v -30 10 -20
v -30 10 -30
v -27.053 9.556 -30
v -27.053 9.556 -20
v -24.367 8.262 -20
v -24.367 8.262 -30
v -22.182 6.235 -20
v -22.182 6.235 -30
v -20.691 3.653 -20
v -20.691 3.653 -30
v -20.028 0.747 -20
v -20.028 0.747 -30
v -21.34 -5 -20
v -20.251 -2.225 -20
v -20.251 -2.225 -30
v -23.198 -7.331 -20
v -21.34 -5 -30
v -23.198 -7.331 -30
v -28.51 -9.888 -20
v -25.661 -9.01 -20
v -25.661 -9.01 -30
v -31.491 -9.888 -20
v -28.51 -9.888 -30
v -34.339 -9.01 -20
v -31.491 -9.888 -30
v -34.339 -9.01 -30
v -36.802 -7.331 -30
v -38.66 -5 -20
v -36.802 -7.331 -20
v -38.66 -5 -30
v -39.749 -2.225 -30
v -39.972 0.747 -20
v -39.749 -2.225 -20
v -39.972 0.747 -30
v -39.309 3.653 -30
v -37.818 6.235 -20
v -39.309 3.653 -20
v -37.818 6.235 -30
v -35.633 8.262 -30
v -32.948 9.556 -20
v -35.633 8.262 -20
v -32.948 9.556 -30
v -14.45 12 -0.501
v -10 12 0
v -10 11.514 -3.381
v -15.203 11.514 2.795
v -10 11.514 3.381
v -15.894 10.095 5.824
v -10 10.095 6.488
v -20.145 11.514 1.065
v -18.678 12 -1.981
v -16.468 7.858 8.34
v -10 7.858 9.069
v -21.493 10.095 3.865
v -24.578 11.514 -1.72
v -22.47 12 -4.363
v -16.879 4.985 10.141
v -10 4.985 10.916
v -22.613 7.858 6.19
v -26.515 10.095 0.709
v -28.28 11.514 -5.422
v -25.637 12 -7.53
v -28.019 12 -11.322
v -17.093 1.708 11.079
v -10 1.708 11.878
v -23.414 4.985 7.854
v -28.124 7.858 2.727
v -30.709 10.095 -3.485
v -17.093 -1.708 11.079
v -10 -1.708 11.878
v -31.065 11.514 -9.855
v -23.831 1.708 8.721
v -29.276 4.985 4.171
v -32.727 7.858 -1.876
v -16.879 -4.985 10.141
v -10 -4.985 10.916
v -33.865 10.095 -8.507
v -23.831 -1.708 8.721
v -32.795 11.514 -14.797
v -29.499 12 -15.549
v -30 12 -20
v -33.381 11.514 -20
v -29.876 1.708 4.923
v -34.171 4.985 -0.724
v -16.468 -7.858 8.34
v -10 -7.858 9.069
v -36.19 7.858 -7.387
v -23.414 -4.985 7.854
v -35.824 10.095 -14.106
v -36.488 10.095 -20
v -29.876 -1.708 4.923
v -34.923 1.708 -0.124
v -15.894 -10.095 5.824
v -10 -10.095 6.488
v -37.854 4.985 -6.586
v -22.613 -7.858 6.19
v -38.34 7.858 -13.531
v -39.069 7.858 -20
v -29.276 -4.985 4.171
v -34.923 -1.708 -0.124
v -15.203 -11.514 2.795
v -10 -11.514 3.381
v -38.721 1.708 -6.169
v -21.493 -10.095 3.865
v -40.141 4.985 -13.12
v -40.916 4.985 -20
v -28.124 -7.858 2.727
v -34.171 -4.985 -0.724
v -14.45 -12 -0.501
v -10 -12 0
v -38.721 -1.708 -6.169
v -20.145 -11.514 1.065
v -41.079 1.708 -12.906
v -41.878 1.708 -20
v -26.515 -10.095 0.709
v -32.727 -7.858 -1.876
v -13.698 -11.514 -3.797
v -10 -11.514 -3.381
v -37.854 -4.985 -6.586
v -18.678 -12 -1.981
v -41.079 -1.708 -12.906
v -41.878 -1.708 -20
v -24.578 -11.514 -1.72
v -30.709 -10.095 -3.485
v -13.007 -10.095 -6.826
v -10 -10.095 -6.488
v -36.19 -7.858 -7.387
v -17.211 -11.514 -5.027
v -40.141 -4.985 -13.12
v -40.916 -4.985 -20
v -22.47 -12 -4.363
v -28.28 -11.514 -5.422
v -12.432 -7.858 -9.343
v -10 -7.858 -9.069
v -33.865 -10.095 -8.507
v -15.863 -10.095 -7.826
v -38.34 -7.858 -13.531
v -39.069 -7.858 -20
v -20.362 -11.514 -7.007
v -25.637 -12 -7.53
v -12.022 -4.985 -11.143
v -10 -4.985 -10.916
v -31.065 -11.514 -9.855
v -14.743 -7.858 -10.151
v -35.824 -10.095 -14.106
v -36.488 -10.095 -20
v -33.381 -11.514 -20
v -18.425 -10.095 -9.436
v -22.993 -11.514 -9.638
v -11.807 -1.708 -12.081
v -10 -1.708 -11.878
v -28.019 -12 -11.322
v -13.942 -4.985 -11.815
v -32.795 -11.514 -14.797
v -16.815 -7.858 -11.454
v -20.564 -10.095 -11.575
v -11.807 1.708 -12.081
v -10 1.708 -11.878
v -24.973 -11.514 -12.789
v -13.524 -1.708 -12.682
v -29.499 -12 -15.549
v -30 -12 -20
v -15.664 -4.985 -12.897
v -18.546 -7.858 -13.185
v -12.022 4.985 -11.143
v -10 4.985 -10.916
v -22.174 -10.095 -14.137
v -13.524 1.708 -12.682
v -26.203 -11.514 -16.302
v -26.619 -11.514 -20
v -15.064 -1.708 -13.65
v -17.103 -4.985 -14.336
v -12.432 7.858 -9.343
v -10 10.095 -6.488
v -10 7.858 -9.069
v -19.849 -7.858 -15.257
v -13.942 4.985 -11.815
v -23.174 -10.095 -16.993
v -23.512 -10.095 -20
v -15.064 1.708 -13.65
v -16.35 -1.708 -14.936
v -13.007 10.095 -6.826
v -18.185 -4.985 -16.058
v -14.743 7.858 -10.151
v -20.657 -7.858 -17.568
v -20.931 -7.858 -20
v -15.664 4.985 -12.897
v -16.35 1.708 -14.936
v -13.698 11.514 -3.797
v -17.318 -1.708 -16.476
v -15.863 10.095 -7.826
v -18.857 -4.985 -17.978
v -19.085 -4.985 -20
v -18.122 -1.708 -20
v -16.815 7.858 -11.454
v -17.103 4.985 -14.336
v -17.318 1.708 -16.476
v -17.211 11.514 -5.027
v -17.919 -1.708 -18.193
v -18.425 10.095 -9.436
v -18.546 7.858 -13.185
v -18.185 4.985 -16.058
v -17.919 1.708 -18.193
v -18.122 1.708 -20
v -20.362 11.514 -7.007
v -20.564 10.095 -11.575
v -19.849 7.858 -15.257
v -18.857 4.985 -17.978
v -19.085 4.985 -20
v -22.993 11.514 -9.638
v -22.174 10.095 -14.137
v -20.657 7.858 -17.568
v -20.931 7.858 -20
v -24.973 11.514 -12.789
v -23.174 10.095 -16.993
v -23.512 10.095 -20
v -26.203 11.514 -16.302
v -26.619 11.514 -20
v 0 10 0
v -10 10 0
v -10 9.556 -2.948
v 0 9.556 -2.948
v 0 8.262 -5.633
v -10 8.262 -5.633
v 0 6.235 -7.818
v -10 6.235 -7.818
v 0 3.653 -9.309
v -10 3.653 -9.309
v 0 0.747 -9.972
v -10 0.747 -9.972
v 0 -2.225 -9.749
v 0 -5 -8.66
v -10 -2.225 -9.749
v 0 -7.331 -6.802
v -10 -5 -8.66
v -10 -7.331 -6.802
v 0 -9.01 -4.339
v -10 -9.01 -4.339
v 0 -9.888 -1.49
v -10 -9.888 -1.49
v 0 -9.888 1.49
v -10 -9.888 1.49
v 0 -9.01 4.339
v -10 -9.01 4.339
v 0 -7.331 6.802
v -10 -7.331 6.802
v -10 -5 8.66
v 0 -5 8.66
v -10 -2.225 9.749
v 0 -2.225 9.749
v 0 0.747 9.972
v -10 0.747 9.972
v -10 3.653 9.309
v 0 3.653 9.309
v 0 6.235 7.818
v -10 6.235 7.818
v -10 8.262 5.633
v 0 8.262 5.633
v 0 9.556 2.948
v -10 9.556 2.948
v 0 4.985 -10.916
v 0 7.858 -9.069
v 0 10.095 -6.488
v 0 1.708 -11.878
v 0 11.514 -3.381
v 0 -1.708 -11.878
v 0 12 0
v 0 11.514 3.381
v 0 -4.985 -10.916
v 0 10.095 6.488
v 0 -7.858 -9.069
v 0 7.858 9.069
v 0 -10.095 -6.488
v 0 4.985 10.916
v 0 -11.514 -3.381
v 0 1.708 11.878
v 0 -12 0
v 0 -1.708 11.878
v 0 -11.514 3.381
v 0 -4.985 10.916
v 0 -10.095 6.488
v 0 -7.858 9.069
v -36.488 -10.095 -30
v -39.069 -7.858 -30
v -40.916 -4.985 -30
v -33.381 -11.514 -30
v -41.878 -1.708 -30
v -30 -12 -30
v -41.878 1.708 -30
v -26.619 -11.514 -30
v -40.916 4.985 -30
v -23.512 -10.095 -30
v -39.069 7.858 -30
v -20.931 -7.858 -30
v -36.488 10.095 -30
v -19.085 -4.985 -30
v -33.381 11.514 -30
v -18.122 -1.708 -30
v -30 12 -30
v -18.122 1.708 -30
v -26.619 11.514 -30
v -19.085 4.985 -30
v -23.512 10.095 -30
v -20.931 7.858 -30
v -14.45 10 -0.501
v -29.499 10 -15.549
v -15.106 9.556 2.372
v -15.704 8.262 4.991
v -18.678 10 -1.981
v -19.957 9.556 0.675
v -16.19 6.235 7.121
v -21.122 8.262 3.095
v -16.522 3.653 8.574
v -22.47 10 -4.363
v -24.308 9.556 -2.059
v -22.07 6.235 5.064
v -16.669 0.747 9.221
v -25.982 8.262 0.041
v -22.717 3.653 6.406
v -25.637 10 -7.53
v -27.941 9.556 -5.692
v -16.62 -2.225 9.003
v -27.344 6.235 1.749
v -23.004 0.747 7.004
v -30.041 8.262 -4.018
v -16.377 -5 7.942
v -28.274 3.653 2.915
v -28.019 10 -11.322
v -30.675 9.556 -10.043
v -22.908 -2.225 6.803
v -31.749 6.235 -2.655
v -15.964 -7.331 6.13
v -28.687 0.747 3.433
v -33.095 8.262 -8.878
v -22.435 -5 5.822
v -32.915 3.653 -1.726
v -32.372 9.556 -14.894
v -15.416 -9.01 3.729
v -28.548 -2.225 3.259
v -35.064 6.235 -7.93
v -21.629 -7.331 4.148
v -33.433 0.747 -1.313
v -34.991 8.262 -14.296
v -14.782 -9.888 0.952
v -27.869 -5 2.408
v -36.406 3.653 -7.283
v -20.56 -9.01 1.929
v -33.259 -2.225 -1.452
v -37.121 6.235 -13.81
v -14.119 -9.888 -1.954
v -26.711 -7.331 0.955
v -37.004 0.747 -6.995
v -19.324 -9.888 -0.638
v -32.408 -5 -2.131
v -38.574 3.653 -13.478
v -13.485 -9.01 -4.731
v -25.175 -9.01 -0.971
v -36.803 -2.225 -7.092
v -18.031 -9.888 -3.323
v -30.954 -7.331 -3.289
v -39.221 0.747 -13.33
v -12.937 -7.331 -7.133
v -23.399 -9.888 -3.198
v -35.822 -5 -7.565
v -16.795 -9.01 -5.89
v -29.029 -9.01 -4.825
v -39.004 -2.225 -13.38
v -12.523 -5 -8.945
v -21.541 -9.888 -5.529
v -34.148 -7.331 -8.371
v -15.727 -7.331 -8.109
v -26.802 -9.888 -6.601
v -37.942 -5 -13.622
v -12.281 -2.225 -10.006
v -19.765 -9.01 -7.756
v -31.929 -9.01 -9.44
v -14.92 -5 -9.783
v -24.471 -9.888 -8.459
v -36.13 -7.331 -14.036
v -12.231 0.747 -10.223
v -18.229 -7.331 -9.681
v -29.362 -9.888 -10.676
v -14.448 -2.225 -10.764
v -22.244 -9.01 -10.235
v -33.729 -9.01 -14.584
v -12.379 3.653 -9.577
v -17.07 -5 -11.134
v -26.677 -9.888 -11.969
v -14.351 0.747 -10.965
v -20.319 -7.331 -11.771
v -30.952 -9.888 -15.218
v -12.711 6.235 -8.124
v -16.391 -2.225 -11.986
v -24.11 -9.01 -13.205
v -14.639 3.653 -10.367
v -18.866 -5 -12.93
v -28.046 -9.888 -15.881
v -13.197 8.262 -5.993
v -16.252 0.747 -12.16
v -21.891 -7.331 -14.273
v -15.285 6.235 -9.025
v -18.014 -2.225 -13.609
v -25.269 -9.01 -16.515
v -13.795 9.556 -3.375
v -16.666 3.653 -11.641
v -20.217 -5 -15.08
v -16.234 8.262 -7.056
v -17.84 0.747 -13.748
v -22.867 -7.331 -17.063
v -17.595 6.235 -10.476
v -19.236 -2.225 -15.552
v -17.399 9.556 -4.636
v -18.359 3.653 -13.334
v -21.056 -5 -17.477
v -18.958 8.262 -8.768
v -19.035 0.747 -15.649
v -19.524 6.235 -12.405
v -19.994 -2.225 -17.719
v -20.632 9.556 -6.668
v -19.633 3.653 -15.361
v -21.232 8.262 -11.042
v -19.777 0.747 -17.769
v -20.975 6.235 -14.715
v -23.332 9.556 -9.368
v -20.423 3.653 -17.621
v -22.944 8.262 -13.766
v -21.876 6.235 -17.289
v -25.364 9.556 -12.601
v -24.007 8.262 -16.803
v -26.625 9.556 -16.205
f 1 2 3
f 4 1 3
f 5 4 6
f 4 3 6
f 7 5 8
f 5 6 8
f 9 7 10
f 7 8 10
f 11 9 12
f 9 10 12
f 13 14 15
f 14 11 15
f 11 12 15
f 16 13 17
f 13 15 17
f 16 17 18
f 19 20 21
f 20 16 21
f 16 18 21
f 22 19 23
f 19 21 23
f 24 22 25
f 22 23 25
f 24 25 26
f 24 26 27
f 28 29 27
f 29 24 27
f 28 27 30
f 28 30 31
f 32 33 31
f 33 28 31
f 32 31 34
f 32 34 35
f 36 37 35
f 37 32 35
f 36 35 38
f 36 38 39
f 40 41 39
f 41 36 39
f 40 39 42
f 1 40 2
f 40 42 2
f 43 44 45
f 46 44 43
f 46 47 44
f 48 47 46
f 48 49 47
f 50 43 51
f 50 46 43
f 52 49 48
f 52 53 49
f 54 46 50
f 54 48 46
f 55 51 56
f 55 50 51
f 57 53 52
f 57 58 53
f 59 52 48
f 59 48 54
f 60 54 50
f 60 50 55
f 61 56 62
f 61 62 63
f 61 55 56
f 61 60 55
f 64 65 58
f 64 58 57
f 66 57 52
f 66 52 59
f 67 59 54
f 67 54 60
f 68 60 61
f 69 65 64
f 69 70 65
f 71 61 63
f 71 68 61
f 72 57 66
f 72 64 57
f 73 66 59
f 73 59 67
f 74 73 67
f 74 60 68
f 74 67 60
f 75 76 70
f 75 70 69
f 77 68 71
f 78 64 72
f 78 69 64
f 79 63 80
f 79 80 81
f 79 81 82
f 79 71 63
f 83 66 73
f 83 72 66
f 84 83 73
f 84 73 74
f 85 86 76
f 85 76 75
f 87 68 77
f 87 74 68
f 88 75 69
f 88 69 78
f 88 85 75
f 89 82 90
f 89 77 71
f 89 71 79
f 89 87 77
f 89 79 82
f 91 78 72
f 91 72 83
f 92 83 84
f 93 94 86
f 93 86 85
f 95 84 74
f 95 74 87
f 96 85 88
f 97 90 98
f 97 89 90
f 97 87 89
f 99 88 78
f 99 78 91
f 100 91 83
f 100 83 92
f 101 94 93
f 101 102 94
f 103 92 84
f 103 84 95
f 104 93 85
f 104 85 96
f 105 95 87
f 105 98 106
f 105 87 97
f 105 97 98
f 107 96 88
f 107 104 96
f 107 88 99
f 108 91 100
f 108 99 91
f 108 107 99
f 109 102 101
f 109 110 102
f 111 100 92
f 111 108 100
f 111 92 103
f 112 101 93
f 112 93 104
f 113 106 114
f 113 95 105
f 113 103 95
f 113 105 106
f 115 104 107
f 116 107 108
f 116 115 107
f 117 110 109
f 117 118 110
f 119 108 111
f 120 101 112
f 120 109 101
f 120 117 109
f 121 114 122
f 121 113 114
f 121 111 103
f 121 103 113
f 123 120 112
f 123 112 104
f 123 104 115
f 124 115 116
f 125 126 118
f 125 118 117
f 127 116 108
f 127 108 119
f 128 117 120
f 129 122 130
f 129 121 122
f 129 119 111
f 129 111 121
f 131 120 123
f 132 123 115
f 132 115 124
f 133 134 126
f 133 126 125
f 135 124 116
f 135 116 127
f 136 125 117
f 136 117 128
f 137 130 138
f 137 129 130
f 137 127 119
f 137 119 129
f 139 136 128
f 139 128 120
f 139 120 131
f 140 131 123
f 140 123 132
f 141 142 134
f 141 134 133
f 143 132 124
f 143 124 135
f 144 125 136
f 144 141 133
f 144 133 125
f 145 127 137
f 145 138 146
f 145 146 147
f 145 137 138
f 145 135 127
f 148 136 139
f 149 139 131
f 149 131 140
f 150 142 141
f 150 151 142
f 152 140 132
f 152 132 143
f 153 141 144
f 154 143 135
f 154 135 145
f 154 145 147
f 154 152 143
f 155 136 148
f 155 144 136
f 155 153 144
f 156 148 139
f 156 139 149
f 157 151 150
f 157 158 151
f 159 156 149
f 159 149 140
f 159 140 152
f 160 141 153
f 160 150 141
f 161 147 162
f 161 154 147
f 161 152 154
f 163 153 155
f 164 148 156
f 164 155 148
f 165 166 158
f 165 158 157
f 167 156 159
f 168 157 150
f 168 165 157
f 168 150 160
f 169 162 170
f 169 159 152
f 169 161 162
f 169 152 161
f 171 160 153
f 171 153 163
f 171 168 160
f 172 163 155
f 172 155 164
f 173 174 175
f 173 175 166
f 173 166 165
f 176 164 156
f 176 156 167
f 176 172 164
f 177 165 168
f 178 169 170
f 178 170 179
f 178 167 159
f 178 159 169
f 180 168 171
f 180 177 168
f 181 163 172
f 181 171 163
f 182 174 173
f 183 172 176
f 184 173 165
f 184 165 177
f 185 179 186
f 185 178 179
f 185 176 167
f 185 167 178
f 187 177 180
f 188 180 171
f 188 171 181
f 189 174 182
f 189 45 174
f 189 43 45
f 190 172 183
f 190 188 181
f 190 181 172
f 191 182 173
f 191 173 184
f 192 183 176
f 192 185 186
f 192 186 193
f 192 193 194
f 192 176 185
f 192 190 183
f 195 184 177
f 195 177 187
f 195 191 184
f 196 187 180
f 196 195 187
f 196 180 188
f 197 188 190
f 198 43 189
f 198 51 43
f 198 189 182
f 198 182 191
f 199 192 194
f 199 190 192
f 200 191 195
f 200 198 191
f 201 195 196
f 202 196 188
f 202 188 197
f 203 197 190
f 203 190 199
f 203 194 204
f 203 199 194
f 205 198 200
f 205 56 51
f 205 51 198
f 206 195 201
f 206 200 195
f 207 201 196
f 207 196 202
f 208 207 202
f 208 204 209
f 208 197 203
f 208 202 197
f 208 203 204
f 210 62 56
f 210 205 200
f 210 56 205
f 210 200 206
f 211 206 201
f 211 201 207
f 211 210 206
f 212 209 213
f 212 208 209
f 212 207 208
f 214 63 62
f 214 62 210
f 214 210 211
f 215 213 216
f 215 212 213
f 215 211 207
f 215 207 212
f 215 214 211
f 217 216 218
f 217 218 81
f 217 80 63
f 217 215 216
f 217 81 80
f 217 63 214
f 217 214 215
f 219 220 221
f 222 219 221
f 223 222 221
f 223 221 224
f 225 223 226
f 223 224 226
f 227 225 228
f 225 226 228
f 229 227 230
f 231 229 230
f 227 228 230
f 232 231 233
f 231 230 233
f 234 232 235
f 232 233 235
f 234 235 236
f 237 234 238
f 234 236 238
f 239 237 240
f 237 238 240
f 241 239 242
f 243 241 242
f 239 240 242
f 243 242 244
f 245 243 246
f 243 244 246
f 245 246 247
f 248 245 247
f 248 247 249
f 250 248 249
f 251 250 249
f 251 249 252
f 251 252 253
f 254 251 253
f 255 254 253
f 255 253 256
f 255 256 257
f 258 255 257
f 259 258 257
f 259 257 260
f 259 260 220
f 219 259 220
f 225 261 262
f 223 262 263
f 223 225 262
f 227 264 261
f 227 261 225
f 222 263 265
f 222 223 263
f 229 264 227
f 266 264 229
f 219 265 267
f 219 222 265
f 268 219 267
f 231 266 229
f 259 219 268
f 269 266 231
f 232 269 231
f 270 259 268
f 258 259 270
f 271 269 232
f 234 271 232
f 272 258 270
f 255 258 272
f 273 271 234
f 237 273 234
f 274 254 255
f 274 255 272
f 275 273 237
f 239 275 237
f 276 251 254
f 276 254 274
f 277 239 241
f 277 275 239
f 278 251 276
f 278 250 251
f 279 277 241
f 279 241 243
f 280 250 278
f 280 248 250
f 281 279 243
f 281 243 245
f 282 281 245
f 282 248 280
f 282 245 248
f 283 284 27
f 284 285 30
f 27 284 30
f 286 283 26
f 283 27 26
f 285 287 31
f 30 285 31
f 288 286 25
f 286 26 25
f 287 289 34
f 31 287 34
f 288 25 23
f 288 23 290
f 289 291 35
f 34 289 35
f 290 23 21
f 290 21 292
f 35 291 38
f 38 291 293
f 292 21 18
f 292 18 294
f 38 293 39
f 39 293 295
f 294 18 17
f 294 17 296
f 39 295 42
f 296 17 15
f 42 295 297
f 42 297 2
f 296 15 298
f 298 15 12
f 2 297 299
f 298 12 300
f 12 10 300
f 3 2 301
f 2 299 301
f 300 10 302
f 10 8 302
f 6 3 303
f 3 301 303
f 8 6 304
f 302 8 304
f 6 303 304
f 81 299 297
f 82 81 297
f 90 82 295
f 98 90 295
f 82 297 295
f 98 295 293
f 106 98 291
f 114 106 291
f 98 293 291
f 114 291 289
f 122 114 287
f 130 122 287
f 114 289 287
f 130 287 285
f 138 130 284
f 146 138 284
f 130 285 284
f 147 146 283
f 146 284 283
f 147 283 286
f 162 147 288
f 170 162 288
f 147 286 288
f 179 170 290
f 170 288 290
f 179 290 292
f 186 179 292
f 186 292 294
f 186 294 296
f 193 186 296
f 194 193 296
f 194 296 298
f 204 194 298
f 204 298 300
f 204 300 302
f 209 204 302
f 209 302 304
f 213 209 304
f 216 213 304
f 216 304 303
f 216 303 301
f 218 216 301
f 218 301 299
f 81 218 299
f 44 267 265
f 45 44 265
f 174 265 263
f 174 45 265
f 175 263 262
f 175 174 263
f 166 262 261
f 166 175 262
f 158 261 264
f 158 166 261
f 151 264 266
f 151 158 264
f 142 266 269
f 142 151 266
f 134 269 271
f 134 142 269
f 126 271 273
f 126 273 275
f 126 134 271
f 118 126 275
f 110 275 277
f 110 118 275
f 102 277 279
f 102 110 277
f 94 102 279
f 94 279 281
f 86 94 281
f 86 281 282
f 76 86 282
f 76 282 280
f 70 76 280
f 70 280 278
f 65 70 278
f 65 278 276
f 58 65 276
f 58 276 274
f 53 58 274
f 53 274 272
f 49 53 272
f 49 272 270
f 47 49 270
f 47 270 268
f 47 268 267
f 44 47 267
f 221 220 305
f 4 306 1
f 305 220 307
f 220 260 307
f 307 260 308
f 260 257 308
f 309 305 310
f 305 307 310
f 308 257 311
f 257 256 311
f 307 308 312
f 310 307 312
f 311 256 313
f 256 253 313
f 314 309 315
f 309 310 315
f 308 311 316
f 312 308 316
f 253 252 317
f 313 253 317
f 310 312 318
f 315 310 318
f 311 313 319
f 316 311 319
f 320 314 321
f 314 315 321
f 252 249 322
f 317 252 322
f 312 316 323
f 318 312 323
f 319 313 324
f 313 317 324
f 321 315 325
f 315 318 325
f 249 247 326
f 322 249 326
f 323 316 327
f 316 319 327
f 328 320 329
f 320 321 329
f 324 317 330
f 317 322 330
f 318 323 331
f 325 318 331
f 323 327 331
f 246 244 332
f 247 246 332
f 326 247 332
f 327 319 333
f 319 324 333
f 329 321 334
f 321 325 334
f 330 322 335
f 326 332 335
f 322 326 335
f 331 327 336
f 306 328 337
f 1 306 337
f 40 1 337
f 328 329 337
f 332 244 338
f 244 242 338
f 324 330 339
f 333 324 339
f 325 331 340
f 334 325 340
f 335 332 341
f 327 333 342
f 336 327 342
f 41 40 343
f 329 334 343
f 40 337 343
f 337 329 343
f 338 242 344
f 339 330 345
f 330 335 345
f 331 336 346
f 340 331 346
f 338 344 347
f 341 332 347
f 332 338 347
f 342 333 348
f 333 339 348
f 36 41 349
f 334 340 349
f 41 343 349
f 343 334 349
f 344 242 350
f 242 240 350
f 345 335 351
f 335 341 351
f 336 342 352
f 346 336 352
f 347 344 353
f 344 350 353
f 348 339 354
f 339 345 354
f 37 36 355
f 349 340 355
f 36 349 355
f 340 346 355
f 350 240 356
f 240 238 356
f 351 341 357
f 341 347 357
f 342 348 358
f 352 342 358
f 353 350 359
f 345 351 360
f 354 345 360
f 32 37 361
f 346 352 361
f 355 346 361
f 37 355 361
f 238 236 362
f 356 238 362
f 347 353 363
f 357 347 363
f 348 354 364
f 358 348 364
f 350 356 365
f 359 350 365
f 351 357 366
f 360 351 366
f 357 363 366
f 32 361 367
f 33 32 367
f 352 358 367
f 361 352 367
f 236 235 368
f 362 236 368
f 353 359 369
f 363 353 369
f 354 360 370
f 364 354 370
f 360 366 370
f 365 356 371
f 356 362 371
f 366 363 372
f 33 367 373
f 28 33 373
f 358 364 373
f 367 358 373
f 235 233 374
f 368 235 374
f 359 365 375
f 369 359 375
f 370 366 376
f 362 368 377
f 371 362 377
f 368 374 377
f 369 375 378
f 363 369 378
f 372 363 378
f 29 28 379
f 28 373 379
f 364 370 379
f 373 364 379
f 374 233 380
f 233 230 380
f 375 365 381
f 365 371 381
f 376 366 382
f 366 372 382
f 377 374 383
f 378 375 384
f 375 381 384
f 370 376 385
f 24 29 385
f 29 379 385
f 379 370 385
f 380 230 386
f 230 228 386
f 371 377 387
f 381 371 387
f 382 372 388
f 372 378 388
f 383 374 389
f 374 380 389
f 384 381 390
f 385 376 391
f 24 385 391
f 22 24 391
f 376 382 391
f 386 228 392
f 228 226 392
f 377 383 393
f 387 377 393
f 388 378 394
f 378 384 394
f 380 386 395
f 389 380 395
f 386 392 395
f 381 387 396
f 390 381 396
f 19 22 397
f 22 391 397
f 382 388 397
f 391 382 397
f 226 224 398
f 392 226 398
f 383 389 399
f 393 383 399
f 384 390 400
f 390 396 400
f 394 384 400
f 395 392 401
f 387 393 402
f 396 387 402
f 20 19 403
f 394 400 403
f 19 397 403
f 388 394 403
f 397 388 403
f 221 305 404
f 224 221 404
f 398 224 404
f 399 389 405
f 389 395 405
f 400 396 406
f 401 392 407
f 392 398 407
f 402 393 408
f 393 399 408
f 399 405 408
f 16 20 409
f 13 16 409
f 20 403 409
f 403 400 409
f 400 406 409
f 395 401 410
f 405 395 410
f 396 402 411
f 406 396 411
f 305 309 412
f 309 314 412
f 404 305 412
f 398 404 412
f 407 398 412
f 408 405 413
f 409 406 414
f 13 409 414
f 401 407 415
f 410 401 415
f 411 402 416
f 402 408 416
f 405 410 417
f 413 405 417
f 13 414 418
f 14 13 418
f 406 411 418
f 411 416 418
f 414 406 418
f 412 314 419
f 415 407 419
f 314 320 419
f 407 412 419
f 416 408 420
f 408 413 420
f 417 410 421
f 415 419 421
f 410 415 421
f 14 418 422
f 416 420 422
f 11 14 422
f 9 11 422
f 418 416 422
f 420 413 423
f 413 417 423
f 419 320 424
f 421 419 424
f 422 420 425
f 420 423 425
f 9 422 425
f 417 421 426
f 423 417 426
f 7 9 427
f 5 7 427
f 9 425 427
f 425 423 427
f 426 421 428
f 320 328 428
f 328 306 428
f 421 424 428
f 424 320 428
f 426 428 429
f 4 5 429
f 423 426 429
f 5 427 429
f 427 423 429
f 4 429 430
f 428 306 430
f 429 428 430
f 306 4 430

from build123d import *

# Parameters (mm, degrees)
F1_R   = 12
F1_R_2 = 10


with BuildPart() as f2:
    # F2: sweep along a path in F0
    with BuildLine(Plane.XZ) as f2_path:
        Line((-0.000112, -2.6e-05), (-10.000112, -2.6e-05))
        ThreePointArc((-10.000112, -2.6e-05), (-24.142248, -5.85789), (-30.000112, -20.000026))
        Line((-30.000112, -20.000026), (-30.000112, -30.000026))
    # F1 (on Right) → F2 (sweep)
    with BuildSketch(Plane.YZ):
        Circle(F1_R)
        Circle(F1_R_2, mode=Mode.SUBTRACT)
    sweep(path=f2_path.line)


solid = f2.part
